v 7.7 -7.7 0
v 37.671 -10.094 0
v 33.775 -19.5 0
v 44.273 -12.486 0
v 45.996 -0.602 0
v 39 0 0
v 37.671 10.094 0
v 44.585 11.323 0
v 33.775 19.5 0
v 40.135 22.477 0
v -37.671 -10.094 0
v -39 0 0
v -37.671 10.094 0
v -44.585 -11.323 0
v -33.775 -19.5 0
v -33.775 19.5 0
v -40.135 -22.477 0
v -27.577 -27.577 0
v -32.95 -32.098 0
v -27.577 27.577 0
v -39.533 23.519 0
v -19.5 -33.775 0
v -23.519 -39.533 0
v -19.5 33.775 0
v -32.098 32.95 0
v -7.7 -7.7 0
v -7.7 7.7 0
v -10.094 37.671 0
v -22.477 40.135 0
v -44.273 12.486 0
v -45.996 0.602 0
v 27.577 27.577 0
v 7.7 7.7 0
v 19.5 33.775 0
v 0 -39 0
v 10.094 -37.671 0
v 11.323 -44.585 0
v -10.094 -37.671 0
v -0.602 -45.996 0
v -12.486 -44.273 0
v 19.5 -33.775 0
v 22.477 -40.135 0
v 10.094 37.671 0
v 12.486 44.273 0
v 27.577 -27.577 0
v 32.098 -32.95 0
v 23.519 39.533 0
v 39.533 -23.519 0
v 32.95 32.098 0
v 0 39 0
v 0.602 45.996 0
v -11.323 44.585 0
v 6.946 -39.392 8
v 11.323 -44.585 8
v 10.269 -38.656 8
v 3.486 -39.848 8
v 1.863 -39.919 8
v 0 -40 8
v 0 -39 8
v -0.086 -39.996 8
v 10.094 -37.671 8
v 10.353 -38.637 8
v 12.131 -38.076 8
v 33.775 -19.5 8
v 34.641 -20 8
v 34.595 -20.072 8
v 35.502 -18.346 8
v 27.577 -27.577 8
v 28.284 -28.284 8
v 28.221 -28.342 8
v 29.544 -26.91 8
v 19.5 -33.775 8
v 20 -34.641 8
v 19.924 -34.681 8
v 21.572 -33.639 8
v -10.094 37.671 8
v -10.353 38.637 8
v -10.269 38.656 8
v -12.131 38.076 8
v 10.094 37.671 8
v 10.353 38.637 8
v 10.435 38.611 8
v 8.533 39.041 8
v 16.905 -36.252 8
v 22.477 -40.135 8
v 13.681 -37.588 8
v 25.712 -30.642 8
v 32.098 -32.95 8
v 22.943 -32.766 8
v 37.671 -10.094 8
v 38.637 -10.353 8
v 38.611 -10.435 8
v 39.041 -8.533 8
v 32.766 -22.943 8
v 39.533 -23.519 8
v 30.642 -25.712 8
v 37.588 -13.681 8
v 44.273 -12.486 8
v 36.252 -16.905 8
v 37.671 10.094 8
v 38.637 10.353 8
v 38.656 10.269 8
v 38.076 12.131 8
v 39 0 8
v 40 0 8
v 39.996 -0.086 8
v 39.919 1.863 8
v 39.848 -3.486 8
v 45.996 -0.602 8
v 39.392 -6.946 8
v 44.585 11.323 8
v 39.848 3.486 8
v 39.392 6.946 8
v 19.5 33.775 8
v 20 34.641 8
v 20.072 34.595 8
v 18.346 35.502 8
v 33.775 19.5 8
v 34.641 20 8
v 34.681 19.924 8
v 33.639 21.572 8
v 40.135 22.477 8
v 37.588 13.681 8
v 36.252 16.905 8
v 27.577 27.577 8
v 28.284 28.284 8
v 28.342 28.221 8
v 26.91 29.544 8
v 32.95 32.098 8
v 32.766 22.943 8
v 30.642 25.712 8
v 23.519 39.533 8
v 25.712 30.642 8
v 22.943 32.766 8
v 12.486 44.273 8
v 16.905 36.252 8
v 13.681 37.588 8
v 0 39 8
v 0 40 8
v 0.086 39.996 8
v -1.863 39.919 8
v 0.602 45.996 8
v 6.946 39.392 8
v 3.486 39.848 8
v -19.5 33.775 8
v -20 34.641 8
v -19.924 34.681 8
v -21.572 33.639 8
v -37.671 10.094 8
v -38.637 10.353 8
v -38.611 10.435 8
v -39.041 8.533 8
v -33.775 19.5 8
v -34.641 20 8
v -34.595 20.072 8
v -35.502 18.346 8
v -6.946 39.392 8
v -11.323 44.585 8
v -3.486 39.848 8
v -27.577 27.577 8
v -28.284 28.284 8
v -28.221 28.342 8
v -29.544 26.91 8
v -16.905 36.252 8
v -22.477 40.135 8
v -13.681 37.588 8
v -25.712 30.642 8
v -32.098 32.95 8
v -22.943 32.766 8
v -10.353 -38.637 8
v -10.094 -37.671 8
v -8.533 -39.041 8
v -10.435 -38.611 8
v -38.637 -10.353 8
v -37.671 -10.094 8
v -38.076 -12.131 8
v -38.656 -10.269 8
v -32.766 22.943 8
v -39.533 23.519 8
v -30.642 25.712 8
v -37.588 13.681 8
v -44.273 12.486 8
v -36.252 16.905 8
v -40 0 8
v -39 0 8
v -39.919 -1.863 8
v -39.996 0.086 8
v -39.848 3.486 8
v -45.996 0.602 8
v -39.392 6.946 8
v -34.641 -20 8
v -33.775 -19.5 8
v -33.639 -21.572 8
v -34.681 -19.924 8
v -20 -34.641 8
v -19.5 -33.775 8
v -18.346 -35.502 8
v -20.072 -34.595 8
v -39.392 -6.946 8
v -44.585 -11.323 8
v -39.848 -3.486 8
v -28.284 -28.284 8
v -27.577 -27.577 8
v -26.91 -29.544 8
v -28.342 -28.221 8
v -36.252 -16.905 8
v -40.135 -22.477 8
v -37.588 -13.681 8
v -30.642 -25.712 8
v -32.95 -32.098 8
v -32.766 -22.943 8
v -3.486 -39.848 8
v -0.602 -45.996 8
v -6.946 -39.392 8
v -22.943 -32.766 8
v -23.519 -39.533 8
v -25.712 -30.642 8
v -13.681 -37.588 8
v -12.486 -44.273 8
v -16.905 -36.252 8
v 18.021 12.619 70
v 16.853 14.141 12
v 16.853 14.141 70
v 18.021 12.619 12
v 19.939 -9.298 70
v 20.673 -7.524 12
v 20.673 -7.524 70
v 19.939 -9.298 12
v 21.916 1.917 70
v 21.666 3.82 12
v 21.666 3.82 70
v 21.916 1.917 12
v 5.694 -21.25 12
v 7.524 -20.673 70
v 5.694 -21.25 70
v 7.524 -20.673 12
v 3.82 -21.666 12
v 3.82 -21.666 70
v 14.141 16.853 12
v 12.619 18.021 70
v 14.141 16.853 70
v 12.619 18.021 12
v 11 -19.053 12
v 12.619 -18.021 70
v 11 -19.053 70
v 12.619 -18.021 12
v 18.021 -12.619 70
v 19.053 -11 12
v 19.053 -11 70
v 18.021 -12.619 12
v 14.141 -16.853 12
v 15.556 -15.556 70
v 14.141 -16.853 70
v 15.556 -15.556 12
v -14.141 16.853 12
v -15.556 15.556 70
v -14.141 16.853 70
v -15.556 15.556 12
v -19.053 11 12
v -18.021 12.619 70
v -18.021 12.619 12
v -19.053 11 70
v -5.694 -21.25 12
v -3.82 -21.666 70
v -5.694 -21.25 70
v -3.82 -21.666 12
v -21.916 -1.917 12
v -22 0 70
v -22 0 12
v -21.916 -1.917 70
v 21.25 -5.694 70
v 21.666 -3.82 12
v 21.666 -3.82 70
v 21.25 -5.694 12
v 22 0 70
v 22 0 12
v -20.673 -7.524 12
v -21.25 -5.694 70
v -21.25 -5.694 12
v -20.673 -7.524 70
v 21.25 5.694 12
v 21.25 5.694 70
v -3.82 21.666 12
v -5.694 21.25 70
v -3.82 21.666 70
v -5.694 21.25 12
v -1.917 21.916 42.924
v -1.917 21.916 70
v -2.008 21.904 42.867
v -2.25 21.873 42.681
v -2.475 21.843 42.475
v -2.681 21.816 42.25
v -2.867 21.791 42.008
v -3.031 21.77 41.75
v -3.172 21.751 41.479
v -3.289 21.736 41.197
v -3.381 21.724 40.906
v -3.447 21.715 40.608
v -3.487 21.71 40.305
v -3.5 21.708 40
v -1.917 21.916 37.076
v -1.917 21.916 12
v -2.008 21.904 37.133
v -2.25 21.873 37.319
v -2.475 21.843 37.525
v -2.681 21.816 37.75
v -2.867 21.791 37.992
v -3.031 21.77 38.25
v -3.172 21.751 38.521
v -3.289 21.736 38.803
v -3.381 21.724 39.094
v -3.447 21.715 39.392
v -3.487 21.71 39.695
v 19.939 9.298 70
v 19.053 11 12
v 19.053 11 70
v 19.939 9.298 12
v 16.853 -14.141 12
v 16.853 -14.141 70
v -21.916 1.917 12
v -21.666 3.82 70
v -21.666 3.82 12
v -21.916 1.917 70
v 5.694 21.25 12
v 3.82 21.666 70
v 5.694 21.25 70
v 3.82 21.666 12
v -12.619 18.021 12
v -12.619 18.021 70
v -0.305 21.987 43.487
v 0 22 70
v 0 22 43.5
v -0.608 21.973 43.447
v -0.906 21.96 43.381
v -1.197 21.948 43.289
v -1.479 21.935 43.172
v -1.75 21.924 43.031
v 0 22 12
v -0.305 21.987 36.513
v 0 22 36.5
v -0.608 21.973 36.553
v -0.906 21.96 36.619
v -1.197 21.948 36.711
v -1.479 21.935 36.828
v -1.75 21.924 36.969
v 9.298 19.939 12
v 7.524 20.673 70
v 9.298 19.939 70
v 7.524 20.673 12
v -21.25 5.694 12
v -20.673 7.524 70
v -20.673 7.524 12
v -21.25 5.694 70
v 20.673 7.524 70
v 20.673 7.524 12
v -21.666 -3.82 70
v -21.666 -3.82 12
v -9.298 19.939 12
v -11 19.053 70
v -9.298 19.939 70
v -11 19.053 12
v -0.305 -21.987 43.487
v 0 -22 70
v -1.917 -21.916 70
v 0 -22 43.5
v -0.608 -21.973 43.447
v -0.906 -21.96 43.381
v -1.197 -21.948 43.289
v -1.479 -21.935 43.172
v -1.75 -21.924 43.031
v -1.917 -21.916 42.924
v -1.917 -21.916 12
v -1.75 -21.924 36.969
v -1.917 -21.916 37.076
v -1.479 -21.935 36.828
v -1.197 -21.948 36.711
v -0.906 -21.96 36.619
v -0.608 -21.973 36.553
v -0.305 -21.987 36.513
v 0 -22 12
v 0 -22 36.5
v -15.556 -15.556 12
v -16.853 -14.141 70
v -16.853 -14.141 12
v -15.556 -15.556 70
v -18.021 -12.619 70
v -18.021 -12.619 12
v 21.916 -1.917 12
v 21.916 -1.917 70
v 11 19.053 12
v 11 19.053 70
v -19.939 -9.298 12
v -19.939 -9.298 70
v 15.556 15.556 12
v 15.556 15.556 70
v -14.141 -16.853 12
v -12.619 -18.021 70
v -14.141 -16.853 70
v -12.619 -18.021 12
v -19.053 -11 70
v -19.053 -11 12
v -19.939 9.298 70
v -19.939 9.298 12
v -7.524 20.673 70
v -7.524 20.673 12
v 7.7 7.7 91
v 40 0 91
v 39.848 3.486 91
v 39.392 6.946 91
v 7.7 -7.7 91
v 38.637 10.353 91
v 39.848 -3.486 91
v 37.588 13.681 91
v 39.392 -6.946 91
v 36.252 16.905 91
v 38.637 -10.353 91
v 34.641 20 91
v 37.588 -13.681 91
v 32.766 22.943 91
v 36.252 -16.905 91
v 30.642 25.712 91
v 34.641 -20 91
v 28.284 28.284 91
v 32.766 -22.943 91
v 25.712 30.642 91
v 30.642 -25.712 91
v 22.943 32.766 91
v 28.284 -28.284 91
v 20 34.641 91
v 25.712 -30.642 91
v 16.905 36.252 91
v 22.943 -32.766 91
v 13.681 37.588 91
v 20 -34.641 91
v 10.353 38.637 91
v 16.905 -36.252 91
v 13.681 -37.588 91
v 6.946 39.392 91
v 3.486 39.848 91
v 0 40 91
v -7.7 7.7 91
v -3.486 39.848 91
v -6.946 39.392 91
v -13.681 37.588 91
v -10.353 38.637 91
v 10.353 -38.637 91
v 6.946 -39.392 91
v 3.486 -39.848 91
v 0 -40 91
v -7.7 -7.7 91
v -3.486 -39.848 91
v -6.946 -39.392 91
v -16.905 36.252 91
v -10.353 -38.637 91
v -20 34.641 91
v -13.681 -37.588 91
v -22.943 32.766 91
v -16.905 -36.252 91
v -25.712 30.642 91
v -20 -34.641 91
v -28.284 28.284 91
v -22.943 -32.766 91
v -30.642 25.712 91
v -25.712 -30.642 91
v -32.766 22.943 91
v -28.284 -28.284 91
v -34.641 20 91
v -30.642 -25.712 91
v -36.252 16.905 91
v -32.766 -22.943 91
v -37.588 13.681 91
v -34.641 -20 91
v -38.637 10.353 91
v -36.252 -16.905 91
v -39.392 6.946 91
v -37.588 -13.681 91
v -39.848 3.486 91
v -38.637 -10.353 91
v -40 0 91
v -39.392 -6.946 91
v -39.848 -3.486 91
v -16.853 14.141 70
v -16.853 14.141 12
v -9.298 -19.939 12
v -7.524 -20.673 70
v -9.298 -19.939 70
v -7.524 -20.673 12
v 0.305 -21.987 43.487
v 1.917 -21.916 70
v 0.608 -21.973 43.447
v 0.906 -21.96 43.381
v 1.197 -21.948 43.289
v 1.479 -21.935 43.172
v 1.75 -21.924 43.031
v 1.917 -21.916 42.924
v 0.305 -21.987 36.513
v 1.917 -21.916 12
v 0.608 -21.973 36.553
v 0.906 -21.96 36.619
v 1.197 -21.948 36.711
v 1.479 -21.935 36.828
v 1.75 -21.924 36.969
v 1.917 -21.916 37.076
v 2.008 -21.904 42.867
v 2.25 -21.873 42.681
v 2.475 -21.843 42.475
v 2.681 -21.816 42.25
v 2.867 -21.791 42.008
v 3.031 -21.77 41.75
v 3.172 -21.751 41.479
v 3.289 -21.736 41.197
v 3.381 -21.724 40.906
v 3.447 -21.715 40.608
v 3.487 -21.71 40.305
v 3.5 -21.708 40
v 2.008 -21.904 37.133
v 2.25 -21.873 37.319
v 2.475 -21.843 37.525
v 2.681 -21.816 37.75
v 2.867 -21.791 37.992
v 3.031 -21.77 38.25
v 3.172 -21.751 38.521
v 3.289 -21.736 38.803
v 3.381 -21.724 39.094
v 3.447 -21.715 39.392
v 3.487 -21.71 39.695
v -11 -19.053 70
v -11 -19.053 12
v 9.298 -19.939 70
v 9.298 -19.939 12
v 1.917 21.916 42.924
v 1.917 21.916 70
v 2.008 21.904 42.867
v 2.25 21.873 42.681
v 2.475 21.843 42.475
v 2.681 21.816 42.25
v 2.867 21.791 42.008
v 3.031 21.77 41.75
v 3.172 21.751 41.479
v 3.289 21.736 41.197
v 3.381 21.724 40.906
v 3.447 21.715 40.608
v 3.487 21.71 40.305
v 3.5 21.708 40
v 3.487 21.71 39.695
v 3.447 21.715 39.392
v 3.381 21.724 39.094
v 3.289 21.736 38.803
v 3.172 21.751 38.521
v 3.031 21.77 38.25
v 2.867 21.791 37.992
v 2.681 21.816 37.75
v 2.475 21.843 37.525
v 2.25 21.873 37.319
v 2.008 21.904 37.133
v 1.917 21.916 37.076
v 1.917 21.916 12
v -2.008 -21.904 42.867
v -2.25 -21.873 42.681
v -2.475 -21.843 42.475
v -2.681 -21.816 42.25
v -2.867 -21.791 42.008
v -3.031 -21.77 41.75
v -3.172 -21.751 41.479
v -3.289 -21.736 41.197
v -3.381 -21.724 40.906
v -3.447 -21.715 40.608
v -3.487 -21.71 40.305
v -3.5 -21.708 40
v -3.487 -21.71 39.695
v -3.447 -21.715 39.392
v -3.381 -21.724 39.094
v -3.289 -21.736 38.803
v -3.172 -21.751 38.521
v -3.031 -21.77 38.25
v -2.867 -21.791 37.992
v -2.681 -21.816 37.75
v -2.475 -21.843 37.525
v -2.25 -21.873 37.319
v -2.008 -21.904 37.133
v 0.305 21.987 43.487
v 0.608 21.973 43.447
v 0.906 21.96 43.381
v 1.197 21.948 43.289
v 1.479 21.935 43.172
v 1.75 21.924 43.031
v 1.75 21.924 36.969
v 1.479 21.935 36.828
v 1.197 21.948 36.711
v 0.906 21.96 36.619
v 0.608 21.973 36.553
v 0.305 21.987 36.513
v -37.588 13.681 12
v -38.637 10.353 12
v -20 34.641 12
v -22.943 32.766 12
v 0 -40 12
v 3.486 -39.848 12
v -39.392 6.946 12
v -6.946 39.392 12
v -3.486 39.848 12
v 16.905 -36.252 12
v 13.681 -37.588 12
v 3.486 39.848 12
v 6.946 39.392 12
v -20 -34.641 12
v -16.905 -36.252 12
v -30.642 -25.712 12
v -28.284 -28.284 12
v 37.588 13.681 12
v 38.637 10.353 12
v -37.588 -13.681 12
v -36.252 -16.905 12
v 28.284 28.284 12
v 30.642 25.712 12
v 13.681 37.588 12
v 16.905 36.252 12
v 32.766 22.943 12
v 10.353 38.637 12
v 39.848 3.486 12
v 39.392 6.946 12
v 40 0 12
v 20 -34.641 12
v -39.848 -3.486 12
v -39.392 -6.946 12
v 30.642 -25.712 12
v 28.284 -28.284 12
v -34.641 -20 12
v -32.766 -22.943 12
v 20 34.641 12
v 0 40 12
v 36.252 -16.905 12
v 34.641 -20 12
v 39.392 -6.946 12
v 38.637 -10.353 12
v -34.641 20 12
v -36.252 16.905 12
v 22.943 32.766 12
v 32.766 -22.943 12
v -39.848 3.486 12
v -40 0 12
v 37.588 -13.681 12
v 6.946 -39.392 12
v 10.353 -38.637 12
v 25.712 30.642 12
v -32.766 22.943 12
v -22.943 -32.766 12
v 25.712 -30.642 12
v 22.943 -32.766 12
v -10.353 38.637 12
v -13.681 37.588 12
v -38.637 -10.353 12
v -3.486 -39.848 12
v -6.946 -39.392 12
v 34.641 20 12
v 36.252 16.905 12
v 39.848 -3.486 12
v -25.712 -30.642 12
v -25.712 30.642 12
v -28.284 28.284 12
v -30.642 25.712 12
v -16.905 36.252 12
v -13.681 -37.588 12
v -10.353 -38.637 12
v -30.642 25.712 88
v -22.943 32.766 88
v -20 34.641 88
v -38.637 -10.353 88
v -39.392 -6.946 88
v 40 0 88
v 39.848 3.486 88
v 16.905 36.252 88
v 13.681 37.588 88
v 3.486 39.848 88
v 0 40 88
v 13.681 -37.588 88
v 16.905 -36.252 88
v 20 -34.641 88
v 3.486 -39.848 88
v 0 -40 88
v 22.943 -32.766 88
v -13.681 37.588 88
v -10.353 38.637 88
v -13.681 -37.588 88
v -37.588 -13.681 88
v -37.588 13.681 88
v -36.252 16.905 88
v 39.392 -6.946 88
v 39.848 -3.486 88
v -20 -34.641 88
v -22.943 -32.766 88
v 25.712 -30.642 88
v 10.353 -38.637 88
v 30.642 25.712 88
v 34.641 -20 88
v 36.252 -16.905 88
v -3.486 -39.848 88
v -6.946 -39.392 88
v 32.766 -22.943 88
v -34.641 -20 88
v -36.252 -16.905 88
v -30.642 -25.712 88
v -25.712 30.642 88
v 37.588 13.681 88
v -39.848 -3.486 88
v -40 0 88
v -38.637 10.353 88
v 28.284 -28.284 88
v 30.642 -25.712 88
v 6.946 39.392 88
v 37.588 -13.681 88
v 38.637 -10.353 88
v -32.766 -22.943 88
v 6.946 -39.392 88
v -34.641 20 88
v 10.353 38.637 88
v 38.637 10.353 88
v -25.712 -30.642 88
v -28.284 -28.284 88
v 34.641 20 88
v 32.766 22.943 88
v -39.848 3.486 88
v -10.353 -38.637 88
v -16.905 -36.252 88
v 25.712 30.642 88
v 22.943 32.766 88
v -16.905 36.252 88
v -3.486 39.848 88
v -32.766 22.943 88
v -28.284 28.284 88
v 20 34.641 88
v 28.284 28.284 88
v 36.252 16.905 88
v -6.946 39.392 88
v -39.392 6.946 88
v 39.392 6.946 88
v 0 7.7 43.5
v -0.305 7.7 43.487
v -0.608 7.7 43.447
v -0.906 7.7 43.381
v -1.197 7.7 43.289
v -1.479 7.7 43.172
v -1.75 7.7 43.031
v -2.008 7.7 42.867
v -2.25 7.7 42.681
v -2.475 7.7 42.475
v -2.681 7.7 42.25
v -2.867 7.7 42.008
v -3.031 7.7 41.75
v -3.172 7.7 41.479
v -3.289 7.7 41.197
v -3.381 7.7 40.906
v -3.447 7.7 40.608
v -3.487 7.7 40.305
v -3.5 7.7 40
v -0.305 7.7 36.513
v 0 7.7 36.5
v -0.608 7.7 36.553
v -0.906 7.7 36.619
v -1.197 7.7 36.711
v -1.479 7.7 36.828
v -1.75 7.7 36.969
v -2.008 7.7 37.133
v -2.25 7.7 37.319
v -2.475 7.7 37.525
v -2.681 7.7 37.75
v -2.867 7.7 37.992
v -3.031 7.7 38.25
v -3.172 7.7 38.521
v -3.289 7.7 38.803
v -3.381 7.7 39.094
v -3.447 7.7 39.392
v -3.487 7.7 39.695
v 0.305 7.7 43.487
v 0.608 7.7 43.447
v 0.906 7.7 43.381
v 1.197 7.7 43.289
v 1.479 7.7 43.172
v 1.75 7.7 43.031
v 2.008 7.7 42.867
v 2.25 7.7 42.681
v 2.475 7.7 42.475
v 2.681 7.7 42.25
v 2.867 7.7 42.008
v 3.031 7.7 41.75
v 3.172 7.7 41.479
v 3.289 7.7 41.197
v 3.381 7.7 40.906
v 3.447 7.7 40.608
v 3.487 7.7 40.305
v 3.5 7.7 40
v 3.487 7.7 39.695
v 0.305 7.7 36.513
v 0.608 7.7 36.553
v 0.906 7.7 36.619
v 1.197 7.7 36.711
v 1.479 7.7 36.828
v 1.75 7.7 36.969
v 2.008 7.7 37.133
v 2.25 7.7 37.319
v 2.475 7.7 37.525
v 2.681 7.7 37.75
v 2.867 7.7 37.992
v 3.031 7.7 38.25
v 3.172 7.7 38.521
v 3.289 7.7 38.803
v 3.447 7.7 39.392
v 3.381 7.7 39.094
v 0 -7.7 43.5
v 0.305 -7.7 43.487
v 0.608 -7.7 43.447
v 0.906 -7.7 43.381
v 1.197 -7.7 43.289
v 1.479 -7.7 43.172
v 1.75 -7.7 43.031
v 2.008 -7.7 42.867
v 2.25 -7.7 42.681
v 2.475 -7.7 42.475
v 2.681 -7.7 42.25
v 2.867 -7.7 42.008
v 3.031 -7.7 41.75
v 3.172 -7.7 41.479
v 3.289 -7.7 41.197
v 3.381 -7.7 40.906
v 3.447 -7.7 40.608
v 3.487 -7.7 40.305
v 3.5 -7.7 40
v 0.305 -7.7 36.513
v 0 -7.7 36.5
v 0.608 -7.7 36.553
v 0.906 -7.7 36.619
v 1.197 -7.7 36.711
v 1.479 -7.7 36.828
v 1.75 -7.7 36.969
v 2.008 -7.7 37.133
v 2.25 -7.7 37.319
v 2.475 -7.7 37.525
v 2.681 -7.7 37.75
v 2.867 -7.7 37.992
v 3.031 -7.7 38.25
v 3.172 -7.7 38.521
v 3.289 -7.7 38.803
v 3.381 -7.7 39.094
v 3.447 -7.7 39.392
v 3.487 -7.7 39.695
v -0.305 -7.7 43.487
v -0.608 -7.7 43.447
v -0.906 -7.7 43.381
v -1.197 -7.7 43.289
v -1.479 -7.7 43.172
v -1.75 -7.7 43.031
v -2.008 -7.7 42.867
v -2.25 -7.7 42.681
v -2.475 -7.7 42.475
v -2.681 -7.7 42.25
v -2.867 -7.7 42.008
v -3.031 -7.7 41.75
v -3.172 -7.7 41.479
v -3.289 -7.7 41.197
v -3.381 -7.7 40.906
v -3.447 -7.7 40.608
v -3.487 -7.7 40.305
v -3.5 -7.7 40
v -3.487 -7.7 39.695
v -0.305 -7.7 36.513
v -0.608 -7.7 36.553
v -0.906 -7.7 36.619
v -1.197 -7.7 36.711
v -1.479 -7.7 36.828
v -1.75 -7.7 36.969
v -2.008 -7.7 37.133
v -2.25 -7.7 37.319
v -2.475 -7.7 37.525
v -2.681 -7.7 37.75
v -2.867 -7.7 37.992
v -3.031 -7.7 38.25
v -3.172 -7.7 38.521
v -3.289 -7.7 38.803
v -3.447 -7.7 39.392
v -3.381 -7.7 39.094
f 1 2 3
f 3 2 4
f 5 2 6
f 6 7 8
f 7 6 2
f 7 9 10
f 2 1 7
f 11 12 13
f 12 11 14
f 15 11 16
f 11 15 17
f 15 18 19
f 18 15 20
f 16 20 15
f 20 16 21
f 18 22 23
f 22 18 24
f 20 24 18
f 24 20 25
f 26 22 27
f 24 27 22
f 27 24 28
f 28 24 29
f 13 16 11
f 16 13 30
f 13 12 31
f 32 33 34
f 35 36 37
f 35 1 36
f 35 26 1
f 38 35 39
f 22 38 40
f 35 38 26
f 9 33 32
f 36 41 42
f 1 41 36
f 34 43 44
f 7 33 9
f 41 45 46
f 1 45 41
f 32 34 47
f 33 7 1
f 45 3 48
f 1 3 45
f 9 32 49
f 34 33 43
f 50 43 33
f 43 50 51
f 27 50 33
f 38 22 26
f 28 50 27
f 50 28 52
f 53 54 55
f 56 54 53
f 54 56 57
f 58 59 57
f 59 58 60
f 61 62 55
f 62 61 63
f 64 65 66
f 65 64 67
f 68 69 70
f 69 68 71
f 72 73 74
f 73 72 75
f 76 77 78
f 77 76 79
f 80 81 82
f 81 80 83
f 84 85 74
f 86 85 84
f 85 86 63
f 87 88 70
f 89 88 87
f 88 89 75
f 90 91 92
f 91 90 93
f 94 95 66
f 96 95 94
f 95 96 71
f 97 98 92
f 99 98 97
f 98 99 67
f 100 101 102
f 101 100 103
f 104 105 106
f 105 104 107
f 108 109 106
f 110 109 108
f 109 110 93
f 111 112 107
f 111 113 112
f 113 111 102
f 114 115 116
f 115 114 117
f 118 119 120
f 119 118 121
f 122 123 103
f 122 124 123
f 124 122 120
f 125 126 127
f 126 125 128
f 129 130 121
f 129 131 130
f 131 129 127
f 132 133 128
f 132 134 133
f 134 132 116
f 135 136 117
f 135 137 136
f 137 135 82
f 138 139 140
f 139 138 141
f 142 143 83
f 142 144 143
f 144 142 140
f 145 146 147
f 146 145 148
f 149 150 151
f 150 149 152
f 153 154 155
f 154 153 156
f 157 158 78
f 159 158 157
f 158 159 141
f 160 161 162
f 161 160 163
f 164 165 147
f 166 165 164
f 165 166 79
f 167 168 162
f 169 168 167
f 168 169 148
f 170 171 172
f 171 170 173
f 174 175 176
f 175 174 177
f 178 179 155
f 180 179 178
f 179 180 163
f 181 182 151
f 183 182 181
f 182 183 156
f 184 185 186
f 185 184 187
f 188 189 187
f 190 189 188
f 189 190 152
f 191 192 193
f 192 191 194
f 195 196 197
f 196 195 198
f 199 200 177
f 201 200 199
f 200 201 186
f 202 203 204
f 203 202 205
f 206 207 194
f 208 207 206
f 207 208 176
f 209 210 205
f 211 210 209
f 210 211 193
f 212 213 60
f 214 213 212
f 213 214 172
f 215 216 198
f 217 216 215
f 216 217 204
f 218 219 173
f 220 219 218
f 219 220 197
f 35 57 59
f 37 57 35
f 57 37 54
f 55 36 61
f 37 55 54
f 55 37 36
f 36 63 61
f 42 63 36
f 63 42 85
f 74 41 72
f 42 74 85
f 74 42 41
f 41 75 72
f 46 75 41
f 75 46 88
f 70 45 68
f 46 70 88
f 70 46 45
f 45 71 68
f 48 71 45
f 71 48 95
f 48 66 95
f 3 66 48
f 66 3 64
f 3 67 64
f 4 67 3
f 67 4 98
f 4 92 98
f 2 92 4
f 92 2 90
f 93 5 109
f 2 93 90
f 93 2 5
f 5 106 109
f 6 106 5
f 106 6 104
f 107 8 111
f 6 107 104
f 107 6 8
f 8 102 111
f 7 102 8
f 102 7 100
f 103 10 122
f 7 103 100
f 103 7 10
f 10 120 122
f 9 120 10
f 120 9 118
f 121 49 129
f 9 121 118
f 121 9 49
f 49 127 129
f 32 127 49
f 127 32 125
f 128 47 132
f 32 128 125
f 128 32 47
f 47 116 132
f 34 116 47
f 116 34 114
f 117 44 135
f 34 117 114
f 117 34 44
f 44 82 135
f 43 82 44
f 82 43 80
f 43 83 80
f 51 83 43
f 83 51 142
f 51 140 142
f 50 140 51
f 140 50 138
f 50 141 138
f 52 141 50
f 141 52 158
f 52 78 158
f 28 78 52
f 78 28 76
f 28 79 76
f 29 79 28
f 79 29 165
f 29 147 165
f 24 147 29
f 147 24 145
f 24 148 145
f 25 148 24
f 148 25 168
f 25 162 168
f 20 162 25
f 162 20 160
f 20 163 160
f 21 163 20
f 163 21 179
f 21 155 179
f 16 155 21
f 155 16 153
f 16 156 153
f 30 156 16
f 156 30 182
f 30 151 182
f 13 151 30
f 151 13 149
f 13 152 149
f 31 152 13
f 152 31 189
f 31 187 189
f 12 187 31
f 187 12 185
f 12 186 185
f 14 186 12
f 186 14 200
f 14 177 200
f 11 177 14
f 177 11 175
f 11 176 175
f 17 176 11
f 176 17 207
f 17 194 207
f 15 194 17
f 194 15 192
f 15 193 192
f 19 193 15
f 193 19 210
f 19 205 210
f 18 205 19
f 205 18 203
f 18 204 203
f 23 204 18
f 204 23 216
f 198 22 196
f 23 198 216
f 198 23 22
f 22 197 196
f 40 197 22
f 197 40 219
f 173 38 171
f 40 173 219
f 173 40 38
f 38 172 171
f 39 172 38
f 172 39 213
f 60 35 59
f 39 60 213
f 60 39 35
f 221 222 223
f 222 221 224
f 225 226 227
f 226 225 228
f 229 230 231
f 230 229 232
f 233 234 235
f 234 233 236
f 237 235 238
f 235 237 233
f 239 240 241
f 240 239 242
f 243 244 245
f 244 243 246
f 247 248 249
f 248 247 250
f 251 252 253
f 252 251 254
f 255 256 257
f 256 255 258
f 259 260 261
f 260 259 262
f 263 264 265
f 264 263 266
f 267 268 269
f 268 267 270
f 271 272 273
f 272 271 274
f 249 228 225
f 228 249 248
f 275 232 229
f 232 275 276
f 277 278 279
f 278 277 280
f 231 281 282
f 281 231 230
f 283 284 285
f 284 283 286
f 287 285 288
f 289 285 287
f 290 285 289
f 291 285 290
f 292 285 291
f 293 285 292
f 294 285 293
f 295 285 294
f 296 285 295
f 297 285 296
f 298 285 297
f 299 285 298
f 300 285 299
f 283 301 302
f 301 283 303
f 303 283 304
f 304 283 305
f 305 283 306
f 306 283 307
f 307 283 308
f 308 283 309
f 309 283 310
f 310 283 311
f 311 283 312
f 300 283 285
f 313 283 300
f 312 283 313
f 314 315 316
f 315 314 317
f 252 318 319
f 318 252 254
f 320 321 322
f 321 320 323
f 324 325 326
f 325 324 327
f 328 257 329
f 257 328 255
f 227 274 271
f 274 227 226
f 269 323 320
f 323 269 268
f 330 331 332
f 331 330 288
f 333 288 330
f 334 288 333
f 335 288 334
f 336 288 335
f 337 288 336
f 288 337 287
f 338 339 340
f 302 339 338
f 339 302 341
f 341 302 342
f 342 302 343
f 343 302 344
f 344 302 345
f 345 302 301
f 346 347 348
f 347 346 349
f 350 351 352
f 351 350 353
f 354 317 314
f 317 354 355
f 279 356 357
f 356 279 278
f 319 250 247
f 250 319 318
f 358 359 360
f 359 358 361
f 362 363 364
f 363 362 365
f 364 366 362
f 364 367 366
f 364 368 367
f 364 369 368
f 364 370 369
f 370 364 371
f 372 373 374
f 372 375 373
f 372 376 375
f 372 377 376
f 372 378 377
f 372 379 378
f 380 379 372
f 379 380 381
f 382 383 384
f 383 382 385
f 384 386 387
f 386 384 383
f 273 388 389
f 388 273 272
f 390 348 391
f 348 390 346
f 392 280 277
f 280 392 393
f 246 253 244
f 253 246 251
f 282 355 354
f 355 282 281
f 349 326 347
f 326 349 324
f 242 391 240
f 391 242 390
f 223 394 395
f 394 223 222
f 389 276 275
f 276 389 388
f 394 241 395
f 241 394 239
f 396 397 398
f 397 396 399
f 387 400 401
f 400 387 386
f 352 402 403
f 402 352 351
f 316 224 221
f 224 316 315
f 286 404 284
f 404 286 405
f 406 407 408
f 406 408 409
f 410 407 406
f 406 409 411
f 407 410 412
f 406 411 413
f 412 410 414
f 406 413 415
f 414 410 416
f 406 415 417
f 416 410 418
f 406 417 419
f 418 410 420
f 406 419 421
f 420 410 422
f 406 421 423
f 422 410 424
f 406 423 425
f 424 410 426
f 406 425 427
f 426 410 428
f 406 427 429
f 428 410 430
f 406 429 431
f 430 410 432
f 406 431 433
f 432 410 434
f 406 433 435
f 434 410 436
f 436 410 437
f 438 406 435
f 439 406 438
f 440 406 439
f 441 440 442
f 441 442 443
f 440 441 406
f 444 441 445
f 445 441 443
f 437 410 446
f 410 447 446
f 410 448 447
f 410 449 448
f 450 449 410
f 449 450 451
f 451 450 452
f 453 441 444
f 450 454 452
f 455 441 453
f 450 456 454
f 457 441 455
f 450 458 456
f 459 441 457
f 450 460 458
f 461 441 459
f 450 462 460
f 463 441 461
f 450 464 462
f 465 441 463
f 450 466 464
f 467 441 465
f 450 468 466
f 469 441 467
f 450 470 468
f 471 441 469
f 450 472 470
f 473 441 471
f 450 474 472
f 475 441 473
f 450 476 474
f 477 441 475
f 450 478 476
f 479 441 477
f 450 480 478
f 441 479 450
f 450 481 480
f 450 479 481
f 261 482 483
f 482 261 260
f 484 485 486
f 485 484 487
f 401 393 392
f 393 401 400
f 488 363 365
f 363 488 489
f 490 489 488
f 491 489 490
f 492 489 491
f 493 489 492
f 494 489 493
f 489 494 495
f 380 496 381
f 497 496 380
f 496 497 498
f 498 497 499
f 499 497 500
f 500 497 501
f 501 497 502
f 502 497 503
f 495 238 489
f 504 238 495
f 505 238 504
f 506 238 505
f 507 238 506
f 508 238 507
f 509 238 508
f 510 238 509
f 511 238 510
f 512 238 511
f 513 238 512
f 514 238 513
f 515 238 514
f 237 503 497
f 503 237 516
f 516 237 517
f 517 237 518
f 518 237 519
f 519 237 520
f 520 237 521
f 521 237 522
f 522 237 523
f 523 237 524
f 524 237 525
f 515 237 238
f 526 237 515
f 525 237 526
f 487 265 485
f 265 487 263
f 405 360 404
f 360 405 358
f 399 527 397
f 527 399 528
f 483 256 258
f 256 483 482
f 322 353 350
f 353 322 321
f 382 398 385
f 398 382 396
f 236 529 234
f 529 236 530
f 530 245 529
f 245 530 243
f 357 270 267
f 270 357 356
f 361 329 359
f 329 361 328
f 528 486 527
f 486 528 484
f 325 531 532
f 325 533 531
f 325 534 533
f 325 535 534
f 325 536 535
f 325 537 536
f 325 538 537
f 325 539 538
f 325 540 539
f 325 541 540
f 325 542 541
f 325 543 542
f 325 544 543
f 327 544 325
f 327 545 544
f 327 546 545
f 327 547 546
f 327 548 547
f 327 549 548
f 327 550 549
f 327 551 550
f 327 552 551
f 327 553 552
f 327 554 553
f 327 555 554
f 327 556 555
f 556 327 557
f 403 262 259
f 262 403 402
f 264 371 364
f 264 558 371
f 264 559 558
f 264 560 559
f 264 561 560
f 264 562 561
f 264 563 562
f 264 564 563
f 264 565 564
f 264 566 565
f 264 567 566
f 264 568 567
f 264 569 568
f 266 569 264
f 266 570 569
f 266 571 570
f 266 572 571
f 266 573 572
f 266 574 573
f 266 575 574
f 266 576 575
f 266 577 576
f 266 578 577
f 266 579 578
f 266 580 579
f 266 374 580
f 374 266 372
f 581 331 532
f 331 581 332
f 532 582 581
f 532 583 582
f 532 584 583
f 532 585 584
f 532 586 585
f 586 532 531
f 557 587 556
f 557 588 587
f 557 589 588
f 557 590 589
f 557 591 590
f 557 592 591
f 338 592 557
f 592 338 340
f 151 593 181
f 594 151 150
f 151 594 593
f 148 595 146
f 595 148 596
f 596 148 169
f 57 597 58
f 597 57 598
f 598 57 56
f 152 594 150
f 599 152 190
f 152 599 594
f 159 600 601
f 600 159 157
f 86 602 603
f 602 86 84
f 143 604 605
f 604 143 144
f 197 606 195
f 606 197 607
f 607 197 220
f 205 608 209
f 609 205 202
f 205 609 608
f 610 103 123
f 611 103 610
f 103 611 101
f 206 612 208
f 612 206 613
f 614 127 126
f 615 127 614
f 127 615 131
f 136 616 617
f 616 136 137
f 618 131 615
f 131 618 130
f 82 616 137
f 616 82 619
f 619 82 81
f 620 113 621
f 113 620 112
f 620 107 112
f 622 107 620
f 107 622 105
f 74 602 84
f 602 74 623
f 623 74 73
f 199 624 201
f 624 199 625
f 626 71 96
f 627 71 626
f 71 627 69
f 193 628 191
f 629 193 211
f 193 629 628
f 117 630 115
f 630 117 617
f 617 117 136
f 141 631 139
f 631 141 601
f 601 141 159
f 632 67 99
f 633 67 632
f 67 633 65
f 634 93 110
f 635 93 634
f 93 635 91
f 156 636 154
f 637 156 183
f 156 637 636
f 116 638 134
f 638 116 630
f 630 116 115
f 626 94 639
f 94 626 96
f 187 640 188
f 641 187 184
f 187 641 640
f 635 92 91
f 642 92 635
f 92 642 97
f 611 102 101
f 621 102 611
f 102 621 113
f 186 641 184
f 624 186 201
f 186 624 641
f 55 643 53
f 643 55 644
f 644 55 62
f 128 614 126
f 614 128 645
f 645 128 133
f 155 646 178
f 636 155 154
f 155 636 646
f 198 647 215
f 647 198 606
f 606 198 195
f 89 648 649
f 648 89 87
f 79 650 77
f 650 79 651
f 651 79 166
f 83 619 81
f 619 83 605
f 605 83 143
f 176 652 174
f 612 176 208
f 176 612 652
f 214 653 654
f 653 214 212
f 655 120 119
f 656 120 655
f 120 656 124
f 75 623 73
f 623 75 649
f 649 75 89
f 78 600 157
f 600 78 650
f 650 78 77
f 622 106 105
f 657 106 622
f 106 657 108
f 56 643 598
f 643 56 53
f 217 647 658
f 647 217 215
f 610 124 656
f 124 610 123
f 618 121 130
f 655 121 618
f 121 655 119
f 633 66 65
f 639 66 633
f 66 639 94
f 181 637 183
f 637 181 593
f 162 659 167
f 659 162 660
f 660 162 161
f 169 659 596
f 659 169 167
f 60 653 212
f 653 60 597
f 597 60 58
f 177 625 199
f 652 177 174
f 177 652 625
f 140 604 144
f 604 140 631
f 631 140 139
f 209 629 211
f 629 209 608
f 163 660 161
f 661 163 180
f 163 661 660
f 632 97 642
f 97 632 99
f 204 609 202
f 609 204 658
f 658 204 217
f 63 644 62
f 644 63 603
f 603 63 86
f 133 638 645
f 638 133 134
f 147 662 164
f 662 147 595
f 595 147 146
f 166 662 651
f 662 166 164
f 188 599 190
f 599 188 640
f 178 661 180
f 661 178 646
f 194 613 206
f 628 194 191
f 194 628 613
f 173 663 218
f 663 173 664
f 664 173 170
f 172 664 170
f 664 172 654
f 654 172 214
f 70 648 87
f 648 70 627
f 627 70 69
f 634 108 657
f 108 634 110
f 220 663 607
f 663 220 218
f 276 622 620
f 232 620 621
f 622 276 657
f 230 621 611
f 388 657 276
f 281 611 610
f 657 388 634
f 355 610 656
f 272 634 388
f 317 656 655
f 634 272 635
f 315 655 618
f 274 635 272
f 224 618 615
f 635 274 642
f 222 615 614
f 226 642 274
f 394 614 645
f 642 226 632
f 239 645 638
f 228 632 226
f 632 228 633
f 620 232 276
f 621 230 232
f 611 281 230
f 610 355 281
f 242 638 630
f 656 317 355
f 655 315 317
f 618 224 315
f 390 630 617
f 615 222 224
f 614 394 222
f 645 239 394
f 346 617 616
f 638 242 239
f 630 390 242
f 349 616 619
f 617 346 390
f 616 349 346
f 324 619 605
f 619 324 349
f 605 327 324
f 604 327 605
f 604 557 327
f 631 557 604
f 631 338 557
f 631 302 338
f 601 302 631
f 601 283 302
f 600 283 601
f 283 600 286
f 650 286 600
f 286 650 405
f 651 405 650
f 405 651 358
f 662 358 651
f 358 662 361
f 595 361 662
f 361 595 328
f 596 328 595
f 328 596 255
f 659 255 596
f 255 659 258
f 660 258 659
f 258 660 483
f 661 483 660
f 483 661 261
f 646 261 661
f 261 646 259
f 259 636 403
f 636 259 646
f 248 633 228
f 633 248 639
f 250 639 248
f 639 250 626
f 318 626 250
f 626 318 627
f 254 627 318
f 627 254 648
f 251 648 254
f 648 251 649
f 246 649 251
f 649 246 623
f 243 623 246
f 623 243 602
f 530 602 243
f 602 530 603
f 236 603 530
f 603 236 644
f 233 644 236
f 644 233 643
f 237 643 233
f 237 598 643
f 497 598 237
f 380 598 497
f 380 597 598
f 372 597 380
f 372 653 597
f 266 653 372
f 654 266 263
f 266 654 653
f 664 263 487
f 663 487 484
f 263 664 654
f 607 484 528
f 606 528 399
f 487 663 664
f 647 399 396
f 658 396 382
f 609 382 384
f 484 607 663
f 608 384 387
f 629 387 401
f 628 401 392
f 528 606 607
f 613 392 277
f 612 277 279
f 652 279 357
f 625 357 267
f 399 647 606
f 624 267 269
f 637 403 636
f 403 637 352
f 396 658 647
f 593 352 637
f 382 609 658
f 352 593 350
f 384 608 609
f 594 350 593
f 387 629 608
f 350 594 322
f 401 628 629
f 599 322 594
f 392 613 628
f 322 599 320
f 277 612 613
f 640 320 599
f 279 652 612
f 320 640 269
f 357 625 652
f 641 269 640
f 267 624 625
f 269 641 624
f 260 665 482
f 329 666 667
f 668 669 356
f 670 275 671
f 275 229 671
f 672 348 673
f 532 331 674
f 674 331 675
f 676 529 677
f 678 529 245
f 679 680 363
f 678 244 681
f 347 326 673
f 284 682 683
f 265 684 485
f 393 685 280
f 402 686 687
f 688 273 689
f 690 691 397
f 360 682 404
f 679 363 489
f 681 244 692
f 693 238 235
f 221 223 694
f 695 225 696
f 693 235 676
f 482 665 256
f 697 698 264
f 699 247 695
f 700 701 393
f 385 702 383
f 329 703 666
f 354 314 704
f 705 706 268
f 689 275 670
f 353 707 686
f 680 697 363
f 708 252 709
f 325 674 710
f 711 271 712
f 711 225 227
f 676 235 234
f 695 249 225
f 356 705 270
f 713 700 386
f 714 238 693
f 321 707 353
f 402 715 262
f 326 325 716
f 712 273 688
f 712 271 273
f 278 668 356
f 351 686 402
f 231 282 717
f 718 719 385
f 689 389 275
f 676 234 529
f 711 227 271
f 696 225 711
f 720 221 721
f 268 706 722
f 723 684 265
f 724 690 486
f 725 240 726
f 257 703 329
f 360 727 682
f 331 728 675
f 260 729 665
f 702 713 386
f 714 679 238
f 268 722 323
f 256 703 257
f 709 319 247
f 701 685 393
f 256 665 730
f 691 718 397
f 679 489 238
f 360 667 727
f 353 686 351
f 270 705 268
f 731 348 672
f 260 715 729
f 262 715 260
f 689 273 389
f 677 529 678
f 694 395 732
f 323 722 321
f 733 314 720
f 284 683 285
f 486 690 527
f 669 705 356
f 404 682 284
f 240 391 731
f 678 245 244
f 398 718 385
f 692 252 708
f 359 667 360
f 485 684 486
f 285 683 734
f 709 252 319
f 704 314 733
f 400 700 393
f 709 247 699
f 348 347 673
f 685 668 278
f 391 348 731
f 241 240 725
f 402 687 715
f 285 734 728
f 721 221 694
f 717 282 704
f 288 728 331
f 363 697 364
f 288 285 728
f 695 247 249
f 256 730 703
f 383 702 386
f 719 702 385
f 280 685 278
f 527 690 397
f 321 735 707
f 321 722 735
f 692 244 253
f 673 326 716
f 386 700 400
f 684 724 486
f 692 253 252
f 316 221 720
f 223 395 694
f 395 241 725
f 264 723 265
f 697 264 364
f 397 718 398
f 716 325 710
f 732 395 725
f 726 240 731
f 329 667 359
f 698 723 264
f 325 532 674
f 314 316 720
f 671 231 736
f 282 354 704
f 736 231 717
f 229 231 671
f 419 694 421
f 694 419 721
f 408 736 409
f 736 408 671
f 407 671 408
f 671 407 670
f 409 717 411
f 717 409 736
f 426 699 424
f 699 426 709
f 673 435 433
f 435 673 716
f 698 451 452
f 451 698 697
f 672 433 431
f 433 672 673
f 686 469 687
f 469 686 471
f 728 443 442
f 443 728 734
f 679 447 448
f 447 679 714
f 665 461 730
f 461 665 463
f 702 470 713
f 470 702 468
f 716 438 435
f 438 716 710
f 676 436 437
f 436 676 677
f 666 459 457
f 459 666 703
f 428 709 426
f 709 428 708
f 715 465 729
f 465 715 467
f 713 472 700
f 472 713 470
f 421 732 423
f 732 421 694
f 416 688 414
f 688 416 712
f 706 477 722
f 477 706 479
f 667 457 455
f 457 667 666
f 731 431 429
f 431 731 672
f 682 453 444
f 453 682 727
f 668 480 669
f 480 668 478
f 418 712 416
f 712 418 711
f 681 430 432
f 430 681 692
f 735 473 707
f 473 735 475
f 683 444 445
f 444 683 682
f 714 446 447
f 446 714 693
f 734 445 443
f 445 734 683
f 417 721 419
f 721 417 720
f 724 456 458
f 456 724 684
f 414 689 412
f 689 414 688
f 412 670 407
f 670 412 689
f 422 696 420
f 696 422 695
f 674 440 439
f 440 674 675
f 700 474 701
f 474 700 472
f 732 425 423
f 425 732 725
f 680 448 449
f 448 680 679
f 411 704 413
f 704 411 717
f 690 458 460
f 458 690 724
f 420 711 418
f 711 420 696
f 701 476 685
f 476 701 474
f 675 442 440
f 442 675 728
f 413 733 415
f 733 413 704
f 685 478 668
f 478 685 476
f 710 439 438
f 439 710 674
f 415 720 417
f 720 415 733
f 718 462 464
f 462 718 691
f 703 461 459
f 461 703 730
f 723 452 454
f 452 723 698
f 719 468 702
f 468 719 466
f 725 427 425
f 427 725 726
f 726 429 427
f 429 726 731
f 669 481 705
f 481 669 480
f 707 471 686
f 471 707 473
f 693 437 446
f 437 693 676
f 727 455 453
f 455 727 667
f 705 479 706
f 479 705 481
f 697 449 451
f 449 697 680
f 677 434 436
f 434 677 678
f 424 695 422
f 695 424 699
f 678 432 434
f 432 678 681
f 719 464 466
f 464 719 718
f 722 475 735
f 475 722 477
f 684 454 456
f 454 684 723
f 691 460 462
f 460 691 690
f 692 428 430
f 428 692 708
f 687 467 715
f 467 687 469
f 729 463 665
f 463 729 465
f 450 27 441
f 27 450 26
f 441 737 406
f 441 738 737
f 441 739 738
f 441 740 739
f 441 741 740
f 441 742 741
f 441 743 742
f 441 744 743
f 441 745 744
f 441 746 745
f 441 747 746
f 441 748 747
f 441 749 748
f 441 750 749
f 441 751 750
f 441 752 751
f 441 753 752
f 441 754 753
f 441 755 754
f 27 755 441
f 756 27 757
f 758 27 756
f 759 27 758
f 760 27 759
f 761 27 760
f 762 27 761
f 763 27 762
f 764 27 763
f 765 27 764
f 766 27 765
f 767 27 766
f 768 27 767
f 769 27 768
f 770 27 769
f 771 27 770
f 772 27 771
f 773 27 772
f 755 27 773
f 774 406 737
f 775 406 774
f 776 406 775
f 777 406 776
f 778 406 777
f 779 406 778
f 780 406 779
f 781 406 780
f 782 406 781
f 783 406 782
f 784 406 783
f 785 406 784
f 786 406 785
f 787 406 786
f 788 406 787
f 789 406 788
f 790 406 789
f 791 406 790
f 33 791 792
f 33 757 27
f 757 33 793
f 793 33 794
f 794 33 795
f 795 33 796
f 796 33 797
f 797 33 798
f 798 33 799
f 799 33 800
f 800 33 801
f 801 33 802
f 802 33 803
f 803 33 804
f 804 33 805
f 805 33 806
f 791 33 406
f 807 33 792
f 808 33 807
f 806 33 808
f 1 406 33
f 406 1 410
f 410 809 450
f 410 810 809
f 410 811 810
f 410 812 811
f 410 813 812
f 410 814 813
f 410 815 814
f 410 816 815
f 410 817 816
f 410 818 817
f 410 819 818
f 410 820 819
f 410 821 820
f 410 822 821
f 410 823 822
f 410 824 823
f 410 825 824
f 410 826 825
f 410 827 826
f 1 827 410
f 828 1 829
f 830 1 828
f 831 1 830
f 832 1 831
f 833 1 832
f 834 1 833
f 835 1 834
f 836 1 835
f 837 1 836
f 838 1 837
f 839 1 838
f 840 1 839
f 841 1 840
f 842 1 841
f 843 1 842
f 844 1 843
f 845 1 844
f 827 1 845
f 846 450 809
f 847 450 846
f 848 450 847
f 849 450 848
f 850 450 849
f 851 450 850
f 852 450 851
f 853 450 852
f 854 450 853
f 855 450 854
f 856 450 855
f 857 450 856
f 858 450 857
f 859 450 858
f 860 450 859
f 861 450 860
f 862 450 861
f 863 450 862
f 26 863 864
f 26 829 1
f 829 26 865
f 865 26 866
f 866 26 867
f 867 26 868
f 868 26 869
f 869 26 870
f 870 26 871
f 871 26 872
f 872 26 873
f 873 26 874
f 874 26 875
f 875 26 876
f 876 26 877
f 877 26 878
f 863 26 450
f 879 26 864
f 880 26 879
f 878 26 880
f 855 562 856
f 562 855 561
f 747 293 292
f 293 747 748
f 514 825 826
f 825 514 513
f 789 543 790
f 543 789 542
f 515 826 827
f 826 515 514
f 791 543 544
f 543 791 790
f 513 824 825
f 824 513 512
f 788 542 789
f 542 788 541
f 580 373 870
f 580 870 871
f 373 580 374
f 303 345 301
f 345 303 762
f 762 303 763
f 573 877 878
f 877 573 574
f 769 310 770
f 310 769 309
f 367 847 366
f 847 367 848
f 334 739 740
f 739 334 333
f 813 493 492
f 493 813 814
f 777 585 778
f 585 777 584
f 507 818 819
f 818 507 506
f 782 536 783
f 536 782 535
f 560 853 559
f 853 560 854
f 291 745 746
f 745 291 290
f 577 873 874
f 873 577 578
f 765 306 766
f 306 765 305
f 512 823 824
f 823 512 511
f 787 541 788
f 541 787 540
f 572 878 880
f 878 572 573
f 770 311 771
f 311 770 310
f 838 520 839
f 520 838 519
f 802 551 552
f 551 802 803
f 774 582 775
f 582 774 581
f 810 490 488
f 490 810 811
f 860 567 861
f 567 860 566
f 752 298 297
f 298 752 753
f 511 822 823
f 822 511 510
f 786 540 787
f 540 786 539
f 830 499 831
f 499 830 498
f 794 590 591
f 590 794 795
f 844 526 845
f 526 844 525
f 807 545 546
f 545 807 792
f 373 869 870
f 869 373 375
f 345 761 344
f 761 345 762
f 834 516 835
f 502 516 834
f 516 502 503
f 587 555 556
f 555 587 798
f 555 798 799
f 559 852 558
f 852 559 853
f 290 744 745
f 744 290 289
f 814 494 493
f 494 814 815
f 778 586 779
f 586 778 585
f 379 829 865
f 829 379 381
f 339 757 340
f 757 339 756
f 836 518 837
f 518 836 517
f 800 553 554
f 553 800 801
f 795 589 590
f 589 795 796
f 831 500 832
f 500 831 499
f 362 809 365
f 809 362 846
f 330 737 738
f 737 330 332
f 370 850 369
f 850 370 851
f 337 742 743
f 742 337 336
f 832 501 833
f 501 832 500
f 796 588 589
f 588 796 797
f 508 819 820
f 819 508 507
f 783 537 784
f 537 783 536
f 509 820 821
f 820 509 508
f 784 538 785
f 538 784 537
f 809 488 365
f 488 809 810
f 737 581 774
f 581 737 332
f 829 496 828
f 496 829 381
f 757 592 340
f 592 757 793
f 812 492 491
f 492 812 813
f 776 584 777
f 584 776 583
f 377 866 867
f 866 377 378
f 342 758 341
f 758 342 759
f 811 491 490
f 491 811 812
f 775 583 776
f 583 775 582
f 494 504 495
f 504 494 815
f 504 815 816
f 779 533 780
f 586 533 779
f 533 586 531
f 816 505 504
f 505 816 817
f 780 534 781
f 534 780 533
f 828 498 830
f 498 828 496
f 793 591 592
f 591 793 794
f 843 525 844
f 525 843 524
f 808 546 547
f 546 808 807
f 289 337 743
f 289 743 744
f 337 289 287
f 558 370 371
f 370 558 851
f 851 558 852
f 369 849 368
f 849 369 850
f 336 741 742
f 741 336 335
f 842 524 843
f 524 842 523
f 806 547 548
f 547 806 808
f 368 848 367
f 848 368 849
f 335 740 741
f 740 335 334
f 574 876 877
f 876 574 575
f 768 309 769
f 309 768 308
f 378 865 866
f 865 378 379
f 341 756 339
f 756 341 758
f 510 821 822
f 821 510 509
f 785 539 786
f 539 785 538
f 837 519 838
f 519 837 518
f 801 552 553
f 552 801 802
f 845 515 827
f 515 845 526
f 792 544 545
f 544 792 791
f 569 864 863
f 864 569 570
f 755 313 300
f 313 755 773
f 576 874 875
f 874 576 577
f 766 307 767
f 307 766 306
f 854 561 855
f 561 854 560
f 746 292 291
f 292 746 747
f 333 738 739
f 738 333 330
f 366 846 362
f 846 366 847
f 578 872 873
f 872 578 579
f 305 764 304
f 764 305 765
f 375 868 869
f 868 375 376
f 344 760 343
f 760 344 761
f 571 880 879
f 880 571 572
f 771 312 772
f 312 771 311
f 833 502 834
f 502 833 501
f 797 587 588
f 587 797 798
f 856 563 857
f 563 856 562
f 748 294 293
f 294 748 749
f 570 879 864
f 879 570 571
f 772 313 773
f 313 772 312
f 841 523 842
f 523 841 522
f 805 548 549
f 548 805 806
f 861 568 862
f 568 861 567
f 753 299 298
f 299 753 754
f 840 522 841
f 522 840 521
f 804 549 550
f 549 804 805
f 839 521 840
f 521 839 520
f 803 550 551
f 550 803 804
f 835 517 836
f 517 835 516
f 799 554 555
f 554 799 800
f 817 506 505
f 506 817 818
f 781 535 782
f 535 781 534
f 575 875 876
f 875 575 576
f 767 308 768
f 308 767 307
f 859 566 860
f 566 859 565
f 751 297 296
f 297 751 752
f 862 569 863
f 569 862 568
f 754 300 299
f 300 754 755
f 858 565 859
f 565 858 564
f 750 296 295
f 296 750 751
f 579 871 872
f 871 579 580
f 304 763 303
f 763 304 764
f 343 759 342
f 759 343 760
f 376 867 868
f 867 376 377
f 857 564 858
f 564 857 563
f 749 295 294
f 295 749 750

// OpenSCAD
// @title Hand Winch / Windlass (drum, pawl, crank)
// @category Mechanical
// @material PETG or Nylon, 60%+ infill
// @print Drum: ratchet face down. Pawl and crank flat. No supports.
// @summary Ratcheting rope drum for hauling water buckets from wells, pulling carts up slopes, tensioning fences and lifting loads with a mechanical advantage of about 3:1 (crank radius / drum radius).
// @use Axle: a 15mm square wooden or steel bar through the drum's square hole, supported in two posts/blocks. Slide the crank onto the square end. Mount the pawl on a bolt beside the ratchet so it drops into the teeth - the load can't run back. Tie rope through the drum hole. Never stand under a suspended load.
// @variant drum | -D part="drum"
// @variant pawl | -D part="pawl"
// @variant crank | -D part="crank"

part = "drum";
sq = 15.4;    // square axle + clearance
$fn = 72;

module ratchet2d(r, n) {
  polygon([for (i=[0:n-1]) each [ [ (r-7)*cos(i*360/n), (r-7)*sin(i*360/n) ],
                                    [ r*cos((i+0.95)*360/n), r*sin((i+0.95)*360/n) ] ]]);
}
module drum() {
  difference() {
    union() {
      linear_extrude(8) ratchet2d(46, 24);
      cylinder(d=44, h=91);
      translate([0,0,8]) cylinder(d=80, h=4);             // bottom flange
      translate([0,0,70]) cylinder(d1=44, d2=80, h=18);   // 45 deg top flange (no supports)
      translate([0,0,88]) cylinder(d=80, h=3);
    }
    translate([0,0,-1]) linear_extrude(100) square(sq, center=true);
    translate([0,0,40]) rotate([90,0,0]) cylinder(d=7, h=60, center=true);  // rope anchor
  }
}
module pawl() {
  linear_extrude(8) difference() {
    hull() { circle(d=18); translate([46,8]) circle(d=6); }
    circle(d=8.4);
  }
}
module crank() {
  difference() {
    union() {
      hull() { cylinder(d=34, h=14); translate([120,0,0]) cylinder(d=24, h=10); }
      translate([120,0,0]) cylinder(d=22, h=80);
    }
    translate([0,0,-1]) linear_extrude(20) square(sq, center=true);
    translate([120,0,-1]) cylinder(d=8.4, h=90);  // M8 bolt through the handle for strength
  }
}
if (part=="drum") drum(); else if (part=="pawl") pawl(); else crank();
